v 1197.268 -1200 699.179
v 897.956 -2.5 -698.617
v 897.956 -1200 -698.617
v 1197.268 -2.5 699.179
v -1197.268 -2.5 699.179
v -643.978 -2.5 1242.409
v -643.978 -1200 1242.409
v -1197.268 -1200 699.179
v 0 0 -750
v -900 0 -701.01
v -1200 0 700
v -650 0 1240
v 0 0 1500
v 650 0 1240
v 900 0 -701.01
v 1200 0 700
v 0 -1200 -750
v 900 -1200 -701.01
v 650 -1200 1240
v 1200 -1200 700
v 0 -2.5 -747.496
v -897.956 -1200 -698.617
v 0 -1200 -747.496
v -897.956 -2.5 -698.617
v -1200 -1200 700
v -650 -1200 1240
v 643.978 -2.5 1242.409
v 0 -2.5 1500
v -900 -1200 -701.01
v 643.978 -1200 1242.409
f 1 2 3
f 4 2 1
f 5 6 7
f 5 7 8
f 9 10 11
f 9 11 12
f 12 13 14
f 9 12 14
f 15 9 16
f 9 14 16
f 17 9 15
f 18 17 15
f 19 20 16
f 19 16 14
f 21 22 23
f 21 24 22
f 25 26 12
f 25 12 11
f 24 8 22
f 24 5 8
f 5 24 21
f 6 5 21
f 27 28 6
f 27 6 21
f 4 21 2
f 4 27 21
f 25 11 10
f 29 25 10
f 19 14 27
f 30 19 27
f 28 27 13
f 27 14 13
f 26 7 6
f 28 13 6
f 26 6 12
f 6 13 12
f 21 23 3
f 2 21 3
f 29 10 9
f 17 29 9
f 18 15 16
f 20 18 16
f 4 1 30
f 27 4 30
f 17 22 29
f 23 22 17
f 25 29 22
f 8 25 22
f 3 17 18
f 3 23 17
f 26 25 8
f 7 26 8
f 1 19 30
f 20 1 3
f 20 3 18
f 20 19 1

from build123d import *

# Parameters (mm, degrees)
F1_DEPTH = 1200
F2_T     = -2.5


# Not quite as in the source:
# - the program builds the solid bodies; features that only make, move or delete a surface that nothing else refers to are left out


with BuildPart() as f1:
    # F0 (on Front) → F1 (new body)
    with BuildSketch(Plane.XZ):
        with BuildLine():
            Line((1200, 700), (64.7834175674, 37.7903269143))
            ThreePointArc((64.7834175674, 37.7903269143), (72.4008160091, 19.5734984411), (75, 0))
            ThreePointArc((75, 0), (70.9319827149, -24.3650123769), (59.1692312499, -46.0868969805))
            Line((59.1692312499, -46.0868969805), (900, -701.0097377681))
            Line((900, -701.0097377681), (1200, 700))
        make_face()
        with BuildLine():
            Line((0, -750), (900, -701.0097377681))
            Line((900, -701.0097377681), (59.1692312499, -46.0868969805))
            ThreePointArc((59.1692312499, -46.0868969805), (32.9278205053, -67.3851514562), (0, -75))
            Line((0, -75), (0, -750))
        make_face()
        with BuildLine():
            ThreePointArc((0, -75), (-32.9278205053, -67.3851514562), (-59.1692312499, -46.0868969805))
            Line((-59.1692312499, -46.0868969805), (-900, -701.0097377681))
            Line((-900, -701.0097377681), (0, -750))
            Line((0, -750), (0, -75))
        make_face()
        with BuildLine():
            ThreePointArc((-59.1692312499, -46.0868969805), (-74.8325594864, -5.0087963342), (-64.7834175674, 37.7903269143))
            Line((-64.7834175674, 37.7903269143), (-1200, 700))
            Line((-1200, 700), (-900, -701.0097377681))
            Line((-900, -701.0097377681), (-59.1692312499, -46.0868969805))
        make_face()
        with BuildLine():
            ThreePointArc((-64.7834175674, 37.7903269143), (-51.8193989205, 54.2194604872), (-34.8205403037, 66.426876887))
            Line((-34.8205403037, 66.426876887), (-650, 1240))
            Line((-650, 1240), (-1200, 700))
            Line((-1200, 700), (-64.7834175674, 37.7903269143))
        make_face()
        with BuildLine():
            ThreePointArc((-34.8205403037, 66.426876887), (-17.9302012464, 72.8251871488), (0, 75))
            Line((0, 75), (0, 1500))
            Line((0, 1500), (-650, 1240))
            Line((-650, 1240), (-34.8205403037, 66.426876887))
        make_face()
        with BuildLine():
            Line((0, 1500), (0, 75))
            ThreePointArc((0, 75), (17.9302012464, 72.8251871488), (34.8205403037, 66.426876887))
            Line((34.8205403037, 66.426876887), (650, 1240))
            Line((650, 1240), (0, 1500))
        make_face()
        with BuildLine():
            Line((650, 1240), (34.8205403037, 66.426876887))
            ThreePointArc((34.8205403037, 66.426876887), (51.8193989205, 54.2194604872), (64.7834175674, 37.7903269143))
            Line((64.7834175674, 37.7903269143), (1200, 700))
            Line((1200, 700), (650, 1240))
        make_face()
        with BuildLine():
            ThreePointArc((34.8205403037, 66.426876887), (17.9302012464, 72.8251871488), (0, 75))
            ThreePointArc((0, 75), (-17.9302012464, 72.8251871488), (-34.8205403037, 66.426876887))
            ThreePointArc((-34.8205403037, 66.426876887), (-51.8193989205, 54.2194604872), (-64.7834175674, 37.7903269143))
            ThreePointArc((-64.7834175674, 37.7903269143), (-74.8325594864, -5.0087963342), (-59.1692312499, -46.0868969805))
            ThreePointArc((-59.1692312499, -46.0868969805), (-32.9278205053, -67.3851514562), (0, -75))
            ThreePointArc((0, -75), (32.9278205053, -67.3851514562), (59.1692312499, -46.0868969805))
            ThreePointArc((59.1692312499, -46.0868969805), (70.9319827149, -24.3650123769), (75, 0))
            ThreePointArc((75, 0), (72.4008160091, 19.5734984411), (64.7834175674, 37.7903269143))
            ThreePointArc((64.7834175674, 37.7903269143), (51.8193989205, 54.2194604872), (34.8205403037, 66.426876887))
        make_face()
    extrude(amount=F1_DEPTH)

    # F2
    f2_openings = [f1.faces().sort_by_distance(p)[0] for p in [
        (-325, -600, 1370),
        (325, -600, 1370),
        (0, -1200, 296.454391),
    ]]
    offset(amount=F2_T, openings=f2_openings)


solid = f1.part
